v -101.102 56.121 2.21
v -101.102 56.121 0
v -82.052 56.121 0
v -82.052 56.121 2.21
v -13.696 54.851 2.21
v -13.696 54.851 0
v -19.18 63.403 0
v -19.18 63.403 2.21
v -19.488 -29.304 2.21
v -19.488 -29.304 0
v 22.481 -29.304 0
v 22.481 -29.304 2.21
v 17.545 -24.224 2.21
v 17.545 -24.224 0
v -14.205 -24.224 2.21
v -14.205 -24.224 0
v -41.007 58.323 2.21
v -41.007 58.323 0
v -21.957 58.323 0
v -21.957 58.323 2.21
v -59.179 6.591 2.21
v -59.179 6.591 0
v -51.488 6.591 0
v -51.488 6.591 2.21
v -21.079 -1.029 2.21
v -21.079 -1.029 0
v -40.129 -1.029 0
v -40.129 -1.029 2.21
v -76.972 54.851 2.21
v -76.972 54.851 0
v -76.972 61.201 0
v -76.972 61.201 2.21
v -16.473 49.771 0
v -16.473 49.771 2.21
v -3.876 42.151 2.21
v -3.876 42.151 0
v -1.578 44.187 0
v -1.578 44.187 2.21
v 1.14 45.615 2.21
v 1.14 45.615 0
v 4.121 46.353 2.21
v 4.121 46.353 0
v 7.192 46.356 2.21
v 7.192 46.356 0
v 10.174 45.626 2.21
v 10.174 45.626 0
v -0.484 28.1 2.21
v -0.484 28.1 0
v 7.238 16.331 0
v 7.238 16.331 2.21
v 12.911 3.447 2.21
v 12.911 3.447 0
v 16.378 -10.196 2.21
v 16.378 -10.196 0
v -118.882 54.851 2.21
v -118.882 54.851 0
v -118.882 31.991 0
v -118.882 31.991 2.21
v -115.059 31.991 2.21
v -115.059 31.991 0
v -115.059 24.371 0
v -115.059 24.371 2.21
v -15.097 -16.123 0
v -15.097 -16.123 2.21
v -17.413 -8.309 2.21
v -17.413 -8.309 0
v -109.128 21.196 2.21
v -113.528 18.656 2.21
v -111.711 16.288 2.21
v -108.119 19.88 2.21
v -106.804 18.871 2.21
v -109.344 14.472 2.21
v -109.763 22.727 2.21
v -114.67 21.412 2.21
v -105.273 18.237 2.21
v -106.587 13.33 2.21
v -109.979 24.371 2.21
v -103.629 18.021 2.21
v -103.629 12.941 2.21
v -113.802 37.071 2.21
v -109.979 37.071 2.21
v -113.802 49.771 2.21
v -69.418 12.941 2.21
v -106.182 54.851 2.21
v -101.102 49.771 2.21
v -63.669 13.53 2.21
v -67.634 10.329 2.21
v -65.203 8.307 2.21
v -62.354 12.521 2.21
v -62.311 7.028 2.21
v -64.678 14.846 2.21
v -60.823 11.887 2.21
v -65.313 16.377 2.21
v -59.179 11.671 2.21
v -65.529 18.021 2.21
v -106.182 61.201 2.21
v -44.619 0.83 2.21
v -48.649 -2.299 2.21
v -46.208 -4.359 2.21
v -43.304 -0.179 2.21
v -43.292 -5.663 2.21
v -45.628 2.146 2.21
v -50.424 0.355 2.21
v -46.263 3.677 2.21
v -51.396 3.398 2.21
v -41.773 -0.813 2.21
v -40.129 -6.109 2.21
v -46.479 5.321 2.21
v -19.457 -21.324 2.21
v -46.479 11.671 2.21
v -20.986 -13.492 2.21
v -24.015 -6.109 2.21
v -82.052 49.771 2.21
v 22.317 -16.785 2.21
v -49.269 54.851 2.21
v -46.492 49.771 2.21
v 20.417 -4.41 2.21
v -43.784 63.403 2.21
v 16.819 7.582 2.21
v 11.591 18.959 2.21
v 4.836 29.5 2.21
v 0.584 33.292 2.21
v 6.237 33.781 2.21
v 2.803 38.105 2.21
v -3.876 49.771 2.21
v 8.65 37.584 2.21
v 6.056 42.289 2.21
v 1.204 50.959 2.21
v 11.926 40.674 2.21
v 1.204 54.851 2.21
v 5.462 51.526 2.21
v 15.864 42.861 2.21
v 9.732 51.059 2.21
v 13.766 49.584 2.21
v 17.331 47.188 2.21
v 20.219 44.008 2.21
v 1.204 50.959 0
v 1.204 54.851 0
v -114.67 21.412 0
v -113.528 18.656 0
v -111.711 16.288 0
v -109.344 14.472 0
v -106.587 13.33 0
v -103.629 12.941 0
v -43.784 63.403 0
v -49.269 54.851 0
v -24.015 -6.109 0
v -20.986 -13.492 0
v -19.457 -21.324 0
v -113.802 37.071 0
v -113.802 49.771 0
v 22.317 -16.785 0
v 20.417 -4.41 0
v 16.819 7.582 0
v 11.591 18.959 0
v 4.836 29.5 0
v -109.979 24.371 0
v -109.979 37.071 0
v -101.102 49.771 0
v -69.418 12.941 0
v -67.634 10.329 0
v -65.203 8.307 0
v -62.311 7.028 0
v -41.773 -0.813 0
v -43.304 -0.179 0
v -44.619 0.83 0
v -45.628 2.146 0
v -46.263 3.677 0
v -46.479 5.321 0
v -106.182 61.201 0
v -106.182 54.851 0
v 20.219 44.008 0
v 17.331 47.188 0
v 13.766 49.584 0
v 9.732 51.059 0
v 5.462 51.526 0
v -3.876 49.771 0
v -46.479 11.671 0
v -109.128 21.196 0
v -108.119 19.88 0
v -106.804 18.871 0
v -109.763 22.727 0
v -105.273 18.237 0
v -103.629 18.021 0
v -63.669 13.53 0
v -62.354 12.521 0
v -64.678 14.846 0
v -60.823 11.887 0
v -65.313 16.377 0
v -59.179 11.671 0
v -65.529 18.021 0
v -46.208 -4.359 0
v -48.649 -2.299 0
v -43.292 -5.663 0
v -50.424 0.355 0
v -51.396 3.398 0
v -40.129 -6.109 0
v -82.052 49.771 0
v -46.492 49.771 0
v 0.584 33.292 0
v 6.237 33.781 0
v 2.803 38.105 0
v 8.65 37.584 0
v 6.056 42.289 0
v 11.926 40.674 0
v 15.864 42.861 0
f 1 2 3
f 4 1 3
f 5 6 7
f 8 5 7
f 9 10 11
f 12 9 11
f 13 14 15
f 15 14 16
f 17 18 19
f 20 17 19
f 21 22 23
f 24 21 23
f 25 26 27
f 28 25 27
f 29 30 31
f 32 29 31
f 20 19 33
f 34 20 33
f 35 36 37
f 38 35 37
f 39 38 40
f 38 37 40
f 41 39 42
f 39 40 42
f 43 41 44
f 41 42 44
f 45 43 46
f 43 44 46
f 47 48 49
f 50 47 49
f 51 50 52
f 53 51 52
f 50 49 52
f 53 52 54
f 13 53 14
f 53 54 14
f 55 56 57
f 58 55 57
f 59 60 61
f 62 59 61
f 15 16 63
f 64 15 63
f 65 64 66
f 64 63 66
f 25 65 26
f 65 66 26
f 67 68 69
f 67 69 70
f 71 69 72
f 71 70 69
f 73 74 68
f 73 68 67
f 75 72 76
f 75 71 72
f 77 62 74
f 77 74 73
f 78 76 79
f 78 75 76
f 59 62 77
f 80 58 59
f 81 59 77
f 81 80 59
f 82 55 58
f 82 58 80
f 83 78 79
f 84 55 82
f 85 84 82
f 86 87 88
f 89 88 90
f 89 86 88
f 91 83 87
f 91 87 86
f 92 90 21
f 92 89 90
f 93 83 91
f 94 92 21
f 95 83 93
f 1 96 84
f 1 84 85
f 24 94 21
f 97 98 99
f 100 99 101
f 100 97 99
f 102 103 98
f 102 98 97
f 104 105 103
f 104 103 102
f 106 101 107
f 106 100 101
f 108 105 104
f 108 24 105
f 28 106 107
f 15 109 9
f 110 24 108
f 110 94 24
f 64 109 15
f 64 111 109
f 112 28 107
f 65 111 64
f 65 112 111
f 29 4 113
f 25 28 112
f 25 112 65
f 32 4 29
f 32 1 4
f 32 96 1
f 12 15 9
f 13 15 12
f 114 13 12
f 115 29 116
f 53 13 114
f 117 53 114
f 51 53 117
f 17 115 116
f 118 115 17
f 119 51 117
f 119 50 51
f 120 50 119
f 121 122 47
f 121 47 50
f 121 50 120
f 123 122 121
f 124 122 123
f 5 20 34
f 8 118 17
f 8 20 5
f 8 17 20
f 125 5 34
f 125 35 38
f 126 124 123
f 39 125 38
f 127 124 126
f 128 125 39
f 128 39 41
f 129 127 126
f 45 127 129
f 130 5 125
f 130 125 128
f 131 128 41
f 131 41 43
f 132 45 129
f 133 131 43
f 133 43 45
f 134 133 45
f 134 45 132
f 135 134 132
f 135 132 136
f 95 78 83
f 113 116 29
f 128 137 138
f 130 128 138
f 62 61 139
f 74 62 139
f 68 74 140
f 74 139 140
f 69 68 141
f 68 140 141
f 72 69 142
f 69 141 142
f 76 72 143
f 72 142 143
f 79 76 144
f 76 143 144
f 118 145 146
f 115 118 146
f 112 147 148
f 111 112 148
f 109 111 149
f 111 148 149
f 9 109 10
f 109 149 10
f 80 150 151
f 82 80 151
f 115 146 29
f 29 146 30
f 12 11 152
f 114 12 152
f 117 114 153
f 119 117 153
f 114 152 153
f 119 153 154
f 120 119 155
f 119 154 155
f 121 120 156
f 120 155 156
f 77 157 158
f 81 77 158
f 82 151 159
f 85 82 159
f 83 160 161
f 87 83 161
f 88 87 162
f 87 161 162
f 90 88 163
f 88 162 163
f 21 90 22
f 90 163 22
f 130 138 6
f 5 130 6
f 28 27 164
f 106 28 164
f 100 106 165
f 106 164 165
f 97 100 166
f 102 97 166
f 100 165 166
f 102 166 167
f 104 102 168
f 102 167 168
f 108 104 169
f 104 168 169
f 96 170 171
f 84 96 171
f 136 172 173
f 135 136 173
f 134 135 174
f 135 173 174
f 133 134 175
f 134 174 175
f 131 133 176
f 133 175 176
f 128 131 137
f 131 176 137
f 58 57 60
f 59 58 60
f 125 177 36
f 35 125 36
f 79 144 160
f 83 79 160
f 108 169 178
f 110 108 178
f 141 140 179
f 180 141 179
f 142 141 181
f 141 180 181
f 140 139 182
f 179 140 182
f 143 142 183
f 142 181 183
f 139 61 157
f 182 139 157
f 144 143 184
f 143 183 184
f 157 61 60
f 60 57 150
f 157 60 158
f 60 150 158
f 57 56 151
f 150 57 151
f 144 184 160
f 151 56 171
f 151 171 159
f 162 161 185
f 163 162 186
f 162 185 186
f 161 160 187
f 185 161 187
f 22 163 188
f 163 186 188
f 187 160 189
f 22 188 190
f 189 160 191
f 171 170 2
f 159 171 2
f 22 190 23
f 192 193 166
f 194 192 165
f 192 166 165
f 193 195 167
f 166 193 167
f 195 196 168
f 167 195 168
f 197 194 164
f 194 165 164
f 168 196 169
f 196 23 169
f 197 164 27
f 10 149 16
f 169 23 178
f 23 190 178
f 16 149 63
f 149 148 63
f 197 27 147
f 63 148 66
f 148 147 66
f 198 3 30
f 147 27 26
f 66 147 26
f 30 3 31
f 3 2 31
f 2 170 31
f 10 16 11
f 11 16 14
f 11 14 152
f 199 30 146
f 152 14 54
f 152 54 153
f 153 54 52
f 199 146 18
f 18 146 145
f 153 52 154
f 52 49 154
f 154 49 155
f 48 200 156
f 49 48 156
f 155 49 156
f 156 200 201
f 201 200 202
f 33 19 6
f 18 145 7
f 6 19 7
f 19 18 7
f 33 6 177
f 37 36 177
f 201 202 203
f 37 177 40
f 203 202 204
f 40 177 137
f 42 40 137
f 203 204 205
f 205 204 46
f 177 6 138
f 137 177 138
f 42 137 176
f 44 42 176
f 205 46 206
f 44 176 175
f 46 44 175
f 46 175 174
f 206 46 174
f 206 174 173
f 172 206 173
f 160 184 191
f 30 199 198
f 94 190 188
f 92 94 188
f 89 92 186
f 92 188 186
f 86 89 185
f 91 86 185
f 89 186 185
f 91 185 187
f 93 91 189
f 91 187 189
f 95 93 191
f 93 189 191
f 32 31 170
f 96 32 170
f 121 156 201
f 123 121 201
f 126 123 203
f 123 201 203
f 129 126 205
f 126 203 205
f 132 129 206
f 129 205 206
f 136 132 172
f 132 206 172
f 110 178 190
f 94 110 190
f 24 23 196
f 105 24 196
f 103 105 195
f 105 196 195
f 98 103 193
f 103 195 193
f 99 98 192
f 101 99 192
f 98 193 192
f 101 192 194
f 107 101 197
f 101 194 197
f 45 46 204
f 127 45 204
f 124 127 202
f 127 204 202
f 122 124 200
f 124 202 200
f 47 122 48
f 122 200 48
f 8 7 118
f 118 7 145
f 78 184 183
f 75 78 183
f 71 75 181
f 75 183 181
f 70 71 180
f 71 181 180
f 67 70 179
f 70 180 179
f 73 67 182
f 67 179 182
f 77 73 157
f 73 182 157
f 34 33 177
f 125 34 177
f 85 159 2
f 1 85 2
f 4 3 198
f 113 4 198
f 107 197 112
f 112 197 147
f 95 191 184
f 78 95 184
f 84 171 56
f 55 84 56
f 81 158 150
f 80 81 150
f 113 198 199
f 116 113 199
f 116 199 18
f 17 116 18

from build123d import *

# Parameters (mm, degrees)
F1_DEPTH = 2.2098


with BuildPart() as f1:
    # F0 (on Top) → F1 (new body)
    with BuildSketch(Plane.XY):
        with BuildLine():
            Line((-49.268814, 54.850598), (-76.971687, 54.850598))
            Line((-76.971687, 54.850598), (-76.971687, 61.200598))
            Line((-76.971687, 61.200598), (-106.181687, 61.200598))
            Line((-106.181687, 61.200598), (-106.181687, 54.850598))
            Line((-106.181687, 54.850598), (-118.881687, 54.850598))
            Line((-118.881687, 54.850598), (-118.881687, 31.990598))
            Line((-118.881687, 31.990598), (-115.059145, 31.990598))
            Line((-115.059145, 31.990598), (-115.059145, 24.370598))
            ThreePointArc((-115.059145, 24.370598), (-111.711376, 16.288368), (-103.629145, 12.940598))
            Line((-103.629145, 12.940598), (-69.418213, 12.940598))
            ThreePointArc((-69.418213, 12.940598), (-65.203284, 8.306966), (-59.179145, 6.590598))
            Line((-59.179145, 6.590598), (-51.488371, 6.590598))
            ThreePointArc((-51.488371, 6.590598), (-48.648564, -2.299402), (-40.129145, -6.109402))
            Line((-40.129145, -6.109402), (-24.014959, -6.109402))
            ThreePointArc((-24.014959, -6.109402), (-20.028504, -17.370681), (-19.487546, -29.304481))
            Line((-19.487546, -29.304481), (22.481449, -29.304481))
            ThreePointArc((22.481449, -29.304481), (18.826755, 1.648605), (4.836249, 29.500285))
            ThreePointArc((4.836249, 29.500285), (10.191672, 39.231094), (20.218953, 44.008419))
            ThreePointArc((20.218953, 44.008419), (11.793317, 50.443192), (1.204081, 50.958689))
            Line((1.204081, 50.958689), (1.204081, 54.850598))
            Line((1.204081, 54.850598), (-13.695522, 54.850598))
            Line((-13.695522, 54.850598), (-19.180041, 63.403121))
            Line((-19.180041, 63.403121), (-43.784295, 63.403121))
            Line((-43.784295, 63.403121), (-49.268814, 54.850598))
        make_face()
        with BuildLine():
            Line((17.544895, -24.224481), (-14.205105, -24.224481))
            ThreePointArc((-14.205105, -24.224481), (-16.08053, -12.16415), (-21.079145, -1.029402))
            Line((-21.079145, -1.029402), (-40.129145, -1.029402))
            ThreePointArc((-40.129145, -1.029402), (-44.619273, 0.83047), (-46.479145, 5.320598))
            Line((-46.479145, 5.320598), (-46.479145, 11.670598))
            Line((-46.479145, 11.670598), (-59.179145, 11.670598))
            ThreePointArc((-59.179145, 11.670598), (-63.669273, 13.53047), (-65.529145, 18.020598))
            Line((-65.529145, 18.020598), (-103.629145, 18.020598))
            ThreePointArc((-103.629145, 18.020598), (-108.119273, 19.88047), (-109.979145, 24.370598))
            Line((-109.979145, 24.370598), (-109.979145, 37.070598))
            Line((-109.979145, 37.070598), (-113.801687, 37.070598))
            Line((-113.801687, 37.070598), (-113.801687, 49.770598))
            Line((-113.801687, 49.770598), (-101.101687, 49.770598))
            Line((-101.101687, 49.770598), (-101.101687, 56.120598))
            Line((-101.101687, 56.120598), (-82.051687, 56.120598))
            Line((-82.051687, 56.120598), (-82.051687, 49.770598))
            Line((-82.051687, 49.770598), (-46.491687, 49.770598))
            Line((-46.491687, 49.770598), (-41.007168, 58.323121))
            Line((-41.007168, 58.323121), (-21.957168, 58.323121))
            Line((-21.957168, 58.323121), (-16.472649, 49.770598))
            Line((-16.472649, 49.770598), (-3.875919, 49.770598))
            Line((-3.875919, 49.770598), (-3.875919, 42.150598))
            ThreePointArc((-3.875919, 42.150598), (2.608543, 46.074031), (10.174282, 45.625519))
            ThreePointArc((10.174282, 45.625519), (2.802737, 38.105), (-0.484488, 28.100399))
            ThreePointArc((-0.484488, 28.100399), (12.911162, 3.447489), (17.544895, -24.224481))
        make_face(mode=Mode.SUBTRACT)
    extrude(amount=F1_DEPTH)


solid = f1.part
